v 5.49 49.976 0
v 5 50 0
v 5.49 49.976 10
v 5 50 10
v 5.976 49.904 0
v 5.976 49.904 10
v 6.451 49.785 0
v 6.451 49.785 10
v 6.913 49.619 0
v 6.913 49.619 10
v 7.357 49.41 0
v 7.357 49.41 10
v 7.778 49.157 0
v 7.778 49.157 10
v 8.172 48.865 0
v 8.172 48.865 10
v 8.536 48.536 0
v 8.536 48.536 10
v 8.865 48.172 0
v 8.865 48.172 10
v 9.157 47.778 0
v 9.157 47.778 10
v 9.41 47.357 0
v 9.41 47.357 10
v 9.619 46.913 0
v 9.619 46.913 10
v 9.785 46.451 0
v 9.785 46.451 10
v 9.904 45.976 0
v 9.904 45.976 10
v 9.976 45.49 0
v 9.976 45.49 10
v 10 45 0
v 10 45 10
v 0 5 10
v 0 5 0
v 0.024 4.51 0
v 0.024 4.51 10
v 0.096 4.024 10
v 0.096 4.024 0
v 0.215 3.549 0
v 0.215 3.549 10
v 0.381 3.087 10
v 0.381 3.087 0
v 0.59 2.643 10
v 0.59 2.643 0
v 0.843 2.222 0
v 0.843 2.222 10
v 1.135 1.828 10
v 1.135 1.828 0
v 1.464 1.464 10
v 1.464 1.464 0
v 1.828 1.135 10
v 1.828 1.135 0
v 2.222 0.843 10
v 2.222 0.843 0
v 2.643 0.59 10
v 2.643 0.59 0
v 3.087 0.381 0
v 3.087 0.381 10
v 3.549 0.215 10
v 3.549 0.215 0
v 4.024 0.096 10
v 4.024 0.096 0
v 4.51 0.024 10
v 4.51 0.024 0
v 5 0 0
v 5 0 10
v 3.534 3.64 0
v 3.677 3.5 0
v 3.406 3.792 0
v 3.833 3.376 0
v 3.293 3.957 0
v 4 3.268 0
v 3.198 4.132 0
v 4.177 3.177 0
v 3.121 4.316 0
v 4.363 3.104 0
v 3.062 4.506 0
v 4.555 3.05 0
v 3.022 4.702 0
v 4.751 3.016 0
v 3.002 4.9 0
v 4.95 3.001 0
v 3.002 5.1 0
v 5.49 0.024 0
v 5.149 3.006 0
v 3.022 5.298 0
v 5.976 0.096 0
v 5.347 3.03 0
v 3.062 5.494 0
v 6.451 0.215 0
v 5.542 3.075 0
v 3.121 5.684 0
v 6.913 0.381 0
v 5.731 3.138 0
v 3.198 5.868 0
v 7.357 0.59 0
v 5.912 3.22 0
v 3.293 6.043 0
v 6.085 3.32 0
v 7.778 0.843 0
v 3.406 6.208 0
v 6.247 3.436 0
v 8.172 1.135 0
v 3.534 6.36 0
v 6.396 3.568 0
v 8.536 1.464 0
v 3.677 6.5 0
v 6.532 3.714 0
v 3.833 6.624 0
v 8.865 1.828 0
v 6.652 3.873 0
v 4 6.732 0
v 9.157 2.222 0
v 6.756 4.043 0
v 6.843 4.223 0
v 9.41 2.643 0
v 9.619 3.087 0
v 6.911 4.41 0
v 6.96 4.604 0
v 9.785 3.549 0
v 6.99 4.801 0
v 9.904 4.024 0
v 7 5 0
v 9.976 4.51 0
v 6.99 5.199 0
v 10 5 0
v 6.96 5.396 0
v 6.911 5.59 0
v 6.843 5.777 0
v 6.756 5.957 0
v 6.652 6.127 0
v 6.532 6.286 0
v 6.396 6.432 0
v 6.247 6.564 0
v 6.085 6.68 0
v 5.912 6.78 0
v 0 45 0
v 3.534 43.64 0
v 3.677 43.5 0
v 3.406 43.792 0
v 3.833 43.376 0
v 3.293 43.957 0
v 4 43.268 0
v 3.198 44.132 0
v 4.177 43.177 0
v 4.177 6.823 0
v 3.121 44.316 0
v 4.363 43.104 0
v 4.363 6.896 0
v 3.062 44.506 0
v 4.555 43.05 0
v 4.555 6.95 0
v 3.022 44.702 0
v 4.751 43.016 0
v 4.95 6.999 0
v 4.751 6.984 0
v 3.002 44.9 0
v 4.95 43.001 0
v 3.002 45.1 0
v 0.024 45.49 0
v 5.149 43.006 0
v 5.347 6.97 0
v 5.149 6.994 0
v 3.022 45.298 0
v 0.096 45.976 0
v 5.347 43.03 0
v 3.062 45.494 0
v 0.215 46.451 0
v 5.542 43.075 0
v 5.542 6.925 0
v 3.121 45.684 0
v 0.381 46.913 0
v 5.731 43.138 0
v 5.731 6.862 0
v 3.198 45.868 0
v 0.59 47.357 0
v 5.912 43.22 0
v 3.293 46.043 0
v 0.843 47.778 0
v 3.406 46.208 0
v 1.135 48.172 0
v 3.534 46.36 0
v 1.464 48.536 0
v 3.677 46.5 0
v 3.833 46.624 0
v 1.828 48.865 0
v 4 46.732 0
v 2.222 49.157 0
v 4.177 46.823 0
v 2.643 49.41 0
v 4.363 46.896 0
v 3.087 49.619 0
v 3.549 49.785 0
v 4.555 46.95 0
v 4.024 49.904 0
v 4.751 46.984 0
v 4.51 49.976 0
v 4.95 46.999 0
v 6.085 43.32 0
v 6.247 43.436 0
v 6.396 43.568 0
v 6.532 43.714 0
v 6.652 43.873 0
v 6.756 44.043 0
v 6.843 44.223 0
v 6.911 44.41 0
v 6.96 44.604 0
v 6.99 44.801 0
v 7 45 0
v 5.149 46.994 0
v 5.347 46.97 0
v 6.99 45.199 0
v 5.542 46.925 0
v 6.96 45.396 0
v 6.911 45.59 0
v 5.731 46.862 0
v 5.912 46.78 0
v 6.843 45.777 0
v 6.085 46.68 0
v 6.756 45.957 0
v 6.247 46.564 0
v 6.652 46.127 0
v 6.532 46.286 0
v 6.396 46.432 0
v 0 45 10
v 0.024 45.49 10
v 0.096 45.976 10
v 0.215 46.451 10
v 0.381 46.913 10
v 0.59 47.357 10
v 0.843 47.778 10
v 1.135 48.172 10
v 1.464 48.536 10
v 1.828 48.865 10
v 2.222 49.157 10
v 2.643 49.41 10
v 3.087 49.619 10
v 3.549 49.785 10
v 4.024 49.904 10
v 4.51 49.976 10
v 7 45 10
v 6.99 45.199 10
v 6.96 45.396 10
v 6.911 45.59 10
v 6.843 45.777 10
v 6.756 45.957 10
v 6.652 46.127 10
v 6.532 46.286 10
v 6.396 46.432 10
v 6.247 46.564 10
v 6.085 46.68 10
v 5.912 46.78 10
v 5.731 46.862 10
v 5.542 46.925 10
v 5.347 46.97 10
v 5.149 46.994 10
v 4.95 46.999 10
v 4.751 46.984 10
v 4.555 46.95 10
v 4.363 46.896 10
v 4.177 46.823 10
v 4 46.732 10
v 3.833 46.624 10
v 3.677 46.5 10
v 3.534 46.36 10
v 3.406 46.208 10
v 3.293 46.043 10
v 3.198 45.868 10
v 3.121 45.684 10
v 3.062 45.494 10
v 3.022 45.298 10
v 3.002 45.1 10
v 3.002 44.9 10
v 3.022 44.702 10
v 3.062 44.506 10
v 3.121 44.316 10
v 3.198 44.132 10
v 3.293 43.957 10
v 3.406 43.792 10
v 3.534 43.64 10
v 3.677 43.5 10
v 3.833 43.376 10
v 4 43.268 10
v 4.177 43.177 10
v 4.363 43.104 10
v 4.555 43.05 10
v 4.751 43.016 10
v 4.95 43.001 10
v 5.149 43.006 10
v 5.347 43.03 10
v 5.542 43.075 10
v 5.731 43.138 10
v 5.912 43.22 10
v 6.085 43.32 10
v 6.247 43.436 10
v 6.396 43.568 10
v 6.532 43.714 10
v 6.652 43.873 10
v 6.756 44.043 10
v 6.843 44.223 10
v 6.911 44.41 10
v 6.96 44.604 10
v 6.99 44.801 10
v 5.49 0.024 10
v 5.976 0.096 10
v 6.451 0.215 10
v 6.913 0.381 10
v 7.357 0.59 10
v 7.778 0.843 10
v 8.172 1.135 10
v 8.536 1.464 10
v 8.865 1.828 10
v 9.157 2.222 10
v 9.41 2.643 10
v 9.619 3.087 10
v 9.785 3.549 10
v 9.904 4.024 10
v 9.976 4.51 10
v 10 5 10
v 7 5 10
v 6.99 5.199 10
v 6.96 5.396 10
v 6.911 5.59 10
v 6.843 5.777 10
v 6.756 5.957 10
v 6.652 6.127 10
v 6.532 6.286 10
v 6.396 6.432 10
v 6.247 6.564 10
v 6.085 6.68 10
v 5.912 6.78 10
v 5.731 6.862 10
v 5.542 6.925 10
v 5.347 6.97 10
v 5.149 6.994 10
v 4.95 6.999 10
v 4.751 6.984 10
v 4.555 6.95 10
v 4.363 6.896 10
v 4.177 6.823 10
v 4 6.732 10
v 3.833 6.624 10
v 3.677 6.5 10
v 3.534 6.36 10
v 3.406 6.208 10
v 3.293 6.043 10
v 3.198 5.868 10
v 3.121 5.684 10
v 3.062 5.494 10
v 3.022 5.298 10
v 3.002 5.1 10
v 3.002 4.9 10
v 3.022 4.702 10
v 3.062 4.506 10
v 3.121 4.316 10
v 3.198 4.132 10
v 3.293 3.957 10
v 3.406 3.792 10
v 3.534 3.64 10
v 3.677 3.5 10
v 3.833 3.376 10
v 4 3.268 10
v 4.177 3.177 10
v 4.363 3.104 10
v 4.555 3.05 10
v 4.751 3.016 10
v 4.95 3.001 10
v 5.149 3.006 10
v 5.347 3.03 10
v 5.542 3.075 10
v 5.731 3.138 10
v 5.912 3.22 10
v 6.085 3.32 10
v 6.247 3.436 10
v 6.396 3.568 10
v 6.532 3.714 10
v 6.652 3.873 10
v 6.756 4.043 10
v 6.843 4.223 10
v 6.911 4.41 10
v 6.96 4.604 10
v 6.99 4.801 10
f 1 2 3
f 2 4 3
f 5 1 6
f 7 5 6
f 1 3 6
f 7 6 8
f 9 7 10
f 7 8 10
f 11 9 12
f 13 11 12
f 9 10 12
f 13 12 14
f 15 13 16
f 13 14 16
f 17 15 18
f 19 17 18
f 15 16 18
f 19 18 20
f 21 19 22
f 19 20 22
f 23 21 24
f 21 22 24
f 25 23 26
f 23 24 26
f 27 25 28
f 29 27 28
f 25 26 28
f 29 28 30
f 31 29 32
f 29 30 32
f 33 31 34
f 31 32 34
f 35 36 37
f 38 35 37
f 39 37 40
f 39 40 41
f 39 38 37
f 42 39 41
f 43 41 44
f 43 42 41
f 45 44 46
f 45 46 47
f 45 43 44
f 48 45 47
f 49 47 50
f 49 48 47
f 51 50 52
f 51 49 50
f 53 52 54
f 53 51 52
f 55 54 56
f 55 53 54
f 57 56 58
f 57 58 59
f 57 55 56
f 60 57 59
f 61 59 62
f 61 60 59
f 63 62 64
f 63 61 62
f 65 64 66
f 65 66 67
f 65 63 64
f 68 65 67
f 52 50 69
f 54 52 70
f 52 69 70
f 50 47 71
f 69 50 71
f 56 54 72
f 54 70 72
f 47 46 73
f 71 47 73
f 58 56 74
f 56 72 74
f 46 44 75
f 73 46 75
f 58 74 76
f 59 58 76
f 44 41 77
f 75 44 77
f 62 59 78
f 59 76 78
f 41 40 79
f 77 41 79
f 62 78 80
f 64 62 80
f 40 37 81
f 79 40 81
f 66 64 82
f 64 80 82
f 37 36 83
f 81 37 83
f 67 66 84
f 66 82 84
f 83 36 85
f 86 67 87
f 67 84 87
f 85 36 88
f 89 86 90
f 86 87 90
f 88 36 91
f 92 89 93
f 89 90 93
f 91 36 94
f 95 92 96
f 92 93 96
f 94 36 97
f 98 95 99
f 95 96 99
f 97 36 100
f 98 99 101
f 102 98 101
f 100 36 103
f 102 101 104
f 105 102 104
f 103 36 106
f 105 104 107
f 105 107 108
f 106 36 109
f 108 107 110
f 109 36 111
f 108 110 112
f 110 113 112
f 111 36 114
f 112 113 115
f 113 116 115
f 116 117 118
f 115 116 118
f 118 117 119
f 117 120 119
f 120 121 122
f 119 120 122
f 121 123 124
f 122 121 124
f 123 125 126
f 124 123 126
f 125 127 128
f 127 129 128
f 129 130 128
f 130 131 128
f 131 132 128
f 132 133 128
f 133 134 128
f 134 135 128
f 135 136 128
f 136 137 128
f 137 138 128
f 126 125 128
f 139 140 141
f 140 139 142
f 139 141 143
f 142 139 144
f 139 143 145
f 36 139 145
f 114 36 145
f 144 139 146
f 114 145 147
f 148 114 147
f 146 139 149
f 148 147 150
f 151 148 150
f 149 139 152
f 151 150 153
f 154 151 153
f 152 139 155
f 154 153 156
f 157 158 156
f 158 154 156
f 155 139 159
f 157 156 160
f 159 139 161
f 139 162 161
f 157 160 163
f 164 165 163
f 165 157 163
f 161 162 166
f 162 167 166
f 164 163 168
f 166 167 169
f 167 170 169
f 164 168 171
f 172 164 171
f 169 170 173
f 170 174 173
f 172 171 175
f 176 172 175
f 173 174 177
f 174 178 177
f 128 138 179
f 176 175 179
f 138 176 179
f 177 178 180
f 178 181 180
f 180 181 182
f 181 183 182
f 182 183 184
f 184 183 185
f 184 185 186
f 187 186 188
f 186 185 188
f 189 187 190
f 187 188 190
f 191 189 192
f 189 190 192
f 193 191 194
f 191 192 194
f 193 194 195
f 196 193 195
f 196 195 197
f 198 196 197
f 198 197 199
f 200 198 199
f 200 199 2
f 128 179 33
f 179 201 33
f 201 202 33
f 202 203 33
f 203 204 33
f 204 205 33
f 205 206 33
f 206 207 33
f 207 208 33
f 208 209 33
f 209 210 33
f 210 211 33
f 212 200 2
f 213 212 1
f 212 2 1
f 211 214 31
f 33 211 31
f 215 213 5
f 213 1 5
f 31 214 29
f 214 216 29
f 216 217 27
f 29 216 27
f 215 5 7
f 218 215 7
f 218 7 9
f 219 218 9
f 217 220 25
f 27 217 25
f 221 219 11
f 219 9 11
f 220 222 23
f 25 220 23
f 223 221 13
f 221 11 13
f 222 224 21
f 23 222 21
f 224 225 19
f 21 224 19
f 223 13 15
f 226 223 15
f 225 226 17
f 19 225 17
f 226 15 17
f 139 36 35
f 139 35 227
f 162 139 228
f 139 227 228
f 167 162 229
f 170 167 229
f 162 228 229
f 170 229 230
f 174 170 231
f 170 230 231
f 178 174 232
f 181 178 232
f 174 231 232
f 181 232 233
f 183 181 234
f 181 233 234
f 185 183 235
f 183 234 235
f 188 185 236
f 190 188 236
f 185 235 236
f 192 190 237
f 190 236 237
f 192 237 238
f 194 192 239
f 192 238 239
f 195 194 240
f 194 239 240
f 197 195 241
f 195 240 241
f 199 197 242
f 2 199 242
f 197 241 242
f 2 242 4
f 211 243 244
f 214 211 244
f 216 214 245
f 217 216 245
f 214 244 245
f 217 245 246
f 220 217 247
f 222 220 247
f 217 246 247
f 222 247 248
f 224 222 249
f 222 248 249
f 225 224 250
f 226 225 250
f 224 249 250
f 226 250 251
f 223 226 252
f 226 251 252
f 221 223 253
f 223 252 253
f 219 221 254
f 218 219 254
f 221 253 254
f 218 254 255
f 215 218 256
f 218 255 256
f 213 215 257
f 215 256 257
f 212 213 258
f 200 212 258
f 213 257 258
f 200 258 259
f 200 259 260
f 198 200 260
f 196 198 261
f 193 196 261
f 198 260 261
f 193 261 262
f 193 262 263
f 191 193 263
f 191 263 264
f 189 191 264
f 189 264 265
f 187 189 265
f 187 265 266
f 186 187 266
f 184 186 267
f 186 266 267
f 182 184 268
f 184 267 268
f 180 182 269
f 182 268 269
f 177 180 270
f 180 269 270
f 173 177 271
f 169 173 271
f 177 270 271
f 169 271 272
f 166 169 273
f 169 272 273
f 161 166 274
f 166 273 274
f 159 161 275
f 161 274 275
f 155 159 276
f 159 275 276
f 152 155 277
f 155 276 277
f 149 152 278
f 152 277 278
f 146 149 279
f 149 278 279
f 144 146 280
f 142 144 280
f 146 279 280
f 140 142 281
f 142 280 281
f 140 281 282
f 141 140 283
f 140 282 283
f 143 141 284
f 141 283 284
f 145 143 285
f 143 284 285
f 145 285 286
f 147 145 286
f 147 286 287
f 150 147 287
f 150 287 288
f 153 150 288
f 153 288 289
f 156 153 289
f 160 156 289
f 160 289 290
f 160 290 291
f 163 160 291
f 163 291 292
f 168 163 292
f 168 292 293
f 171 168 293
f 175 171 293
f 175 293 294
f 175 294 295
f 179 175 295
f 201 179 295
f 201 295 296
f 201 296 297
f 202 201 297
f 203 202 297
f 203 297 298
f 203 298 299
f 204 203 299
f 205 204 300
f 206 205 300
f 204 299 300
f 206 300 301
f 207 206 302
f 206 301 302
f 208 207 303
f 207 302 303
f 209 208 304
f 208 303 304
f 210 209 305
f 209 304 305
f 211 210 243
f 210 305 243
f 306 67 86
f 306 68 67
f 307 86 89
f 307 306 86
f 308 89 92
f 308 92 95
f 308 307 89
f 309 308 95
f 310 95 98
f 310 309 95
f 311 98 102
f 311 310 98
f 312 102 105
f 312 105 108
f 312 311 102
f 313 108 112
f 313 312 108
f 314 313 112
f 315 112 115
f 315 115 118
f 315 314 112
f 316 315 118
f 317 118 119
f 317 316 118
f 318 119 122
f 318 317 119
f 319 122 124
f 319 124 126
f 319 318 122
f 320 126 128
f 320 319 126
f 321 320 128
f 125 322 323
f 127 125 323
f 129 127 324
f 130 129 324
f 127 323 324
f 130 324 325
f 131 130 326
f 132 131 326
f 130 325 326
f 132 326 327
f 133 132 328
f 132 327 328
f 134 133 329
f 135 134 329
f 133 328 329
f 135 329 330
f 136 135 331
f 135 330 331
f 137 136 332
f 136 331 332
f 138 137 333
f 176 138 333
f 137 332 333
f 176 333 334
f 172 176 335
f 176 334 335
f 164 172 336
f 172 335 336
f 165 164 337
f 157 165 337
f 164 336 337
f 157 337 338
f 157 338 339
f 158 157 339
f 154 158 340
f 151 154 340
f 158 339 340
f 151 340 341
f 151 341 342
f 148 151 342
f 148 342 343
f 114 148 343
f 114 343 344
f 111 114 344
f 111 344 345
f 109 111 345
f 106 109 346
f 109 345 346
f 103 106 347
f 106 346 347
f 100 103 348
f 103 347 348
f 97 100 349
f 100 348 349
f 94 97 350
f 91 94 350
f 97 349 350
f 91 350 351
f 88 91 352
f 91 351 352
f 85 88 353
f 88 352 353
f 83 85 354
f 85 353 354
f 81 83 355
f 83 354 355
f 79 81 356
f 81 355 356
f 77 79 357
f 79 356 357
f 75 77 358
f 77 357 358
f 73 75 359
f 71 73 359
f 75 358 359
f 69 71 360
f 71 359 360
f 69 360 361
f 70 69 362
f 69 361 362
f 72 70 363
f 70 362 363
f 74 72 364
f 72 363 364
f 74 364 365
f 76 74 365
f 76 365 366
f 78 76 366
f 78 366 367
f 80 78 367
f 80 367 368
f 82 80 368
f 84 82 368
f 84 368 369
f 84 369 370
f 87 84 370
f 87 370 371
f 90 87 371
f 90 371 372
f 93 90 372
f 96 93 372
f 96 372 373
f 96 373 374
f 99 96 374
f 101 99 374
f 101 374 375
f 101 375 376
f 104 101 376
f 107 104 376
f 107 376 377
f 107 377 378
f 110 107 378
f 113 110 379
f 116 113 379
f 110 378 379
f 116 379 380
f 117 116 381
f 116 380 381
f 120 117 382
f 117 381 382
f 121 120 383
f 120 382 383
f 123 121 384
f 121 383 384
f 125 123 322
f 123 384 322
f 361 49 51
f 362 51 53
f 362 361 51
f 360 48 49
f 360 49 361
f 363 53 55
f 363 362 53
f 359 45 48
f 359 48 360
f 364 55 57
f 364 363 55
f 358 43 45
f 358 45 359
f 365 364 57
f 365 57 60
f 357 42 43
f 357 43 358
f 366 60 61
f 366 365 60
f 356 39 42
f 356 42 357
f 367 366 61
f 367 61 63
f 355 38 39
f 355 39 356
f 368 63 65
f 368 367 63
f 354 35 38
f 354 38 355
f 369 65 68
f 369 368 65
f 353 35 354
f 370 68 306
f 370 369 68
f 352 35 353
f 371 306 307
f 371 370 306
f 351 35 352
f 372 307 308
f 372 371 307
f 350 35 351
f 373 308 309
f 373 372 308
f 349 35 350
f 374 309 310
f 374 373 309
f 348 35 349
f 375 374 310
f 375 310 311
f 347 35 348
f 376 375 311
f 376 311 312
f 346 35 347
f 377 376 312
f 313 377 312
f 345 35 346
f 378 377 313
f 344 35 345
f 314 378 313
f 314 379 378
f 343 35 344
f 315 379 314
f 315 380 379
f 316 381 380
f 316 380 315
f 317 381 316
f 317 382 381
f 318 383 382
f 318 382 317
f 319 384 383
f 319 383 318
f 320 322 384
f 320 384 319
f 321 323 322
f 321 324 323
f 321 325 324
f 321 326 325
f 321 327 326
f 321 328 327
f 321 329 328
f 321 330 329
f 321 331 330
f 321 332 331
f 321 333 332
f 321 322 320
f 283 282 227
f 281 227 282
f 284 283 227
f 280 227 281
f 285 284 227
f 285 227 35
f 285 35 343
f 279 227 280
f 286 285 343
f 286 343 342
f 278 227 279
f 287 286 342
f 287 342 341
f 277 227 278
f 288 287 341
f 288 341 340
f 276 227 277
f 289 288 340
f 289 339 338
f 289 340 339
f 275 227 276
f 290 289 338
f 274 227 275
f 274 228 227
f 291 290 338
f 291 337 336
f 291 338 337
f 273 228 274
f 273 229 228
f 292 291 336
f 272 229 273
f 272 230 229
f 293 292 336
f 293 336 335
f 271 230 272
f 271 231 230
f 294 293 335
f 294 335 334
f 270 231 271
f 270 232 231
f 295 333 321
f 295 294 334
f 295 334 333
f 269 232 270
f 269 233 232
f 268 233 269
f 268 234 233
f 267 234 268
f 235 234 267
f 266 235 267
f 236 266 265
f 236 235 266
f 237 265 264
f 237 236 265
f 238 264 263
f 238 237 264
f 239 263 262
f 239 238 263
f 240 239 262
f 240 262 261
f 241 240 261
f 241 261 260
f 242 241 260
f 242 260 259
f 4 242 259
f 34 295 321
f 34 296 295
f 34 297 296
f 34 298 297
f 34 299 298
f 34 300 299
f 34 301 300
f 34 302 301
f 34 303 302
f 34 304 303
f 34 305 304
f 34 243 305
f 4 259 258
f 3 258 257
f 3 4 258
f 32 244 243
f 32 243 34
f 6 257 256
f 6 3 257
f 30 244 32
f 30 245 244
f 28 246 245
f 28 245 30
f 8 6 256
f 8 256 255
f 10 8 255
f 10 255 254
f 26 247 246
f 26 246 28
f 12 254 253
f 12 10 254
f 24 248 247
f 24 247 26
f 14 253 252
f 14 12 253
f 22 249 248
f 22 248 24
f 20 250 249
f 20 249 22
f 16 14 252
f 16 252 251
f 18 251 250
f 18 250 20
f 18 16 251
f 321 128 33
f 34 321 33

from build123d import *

# Parameters (mm, degrees)
ESQUISSE1_W             = 10
ESQUISSE1_H             = 50
BOSS_EXTRU_1_DEPTH      = 10
ESQUISSE2_R             = 2
ENL_V_MAT_EXTRU_1_DEPTH = 10
CONG_1_R                = 5


with BuildPart() as part:
    # Esquisse1 → Boss.-Extru.1 (new body)
    with BuildSketch(Plane.XY):
        with Locations((5, 25)):
            Rectangle(ESQUISSE1_W, ESQUISSE1_H)
    extrude(amount=BOSS_EXTRU_1_DEPTH)

    # Esquisse2 → Enlèv. mat.-Extru.1 (cut)
    with BuildSketch(Plane.XY.offset(10)):
        with Locations((5, 45)):
            Circle(ESQUISSE2_R)
        with Locations((5, 5)):
            Circle(ESQUISSE2_R)
    extrude(amount=-ENL_V_MAT_EXTRU_1_DEPTH, mode=Mode.SUBTRACT)

    # Congé1
    cong_1_edges = [part.edges().sort_by_distance(p)[0] for p in [
        (10, 50, 5),
        (0, 50, 5),
        (10, 0, 5),
        (0, 0, 5),
    ]]
    fillet(cong_1_edges, radius=CONG_1_R - 0.0001)  # a hair under: the kernel refuses the full size


solid = part.part
